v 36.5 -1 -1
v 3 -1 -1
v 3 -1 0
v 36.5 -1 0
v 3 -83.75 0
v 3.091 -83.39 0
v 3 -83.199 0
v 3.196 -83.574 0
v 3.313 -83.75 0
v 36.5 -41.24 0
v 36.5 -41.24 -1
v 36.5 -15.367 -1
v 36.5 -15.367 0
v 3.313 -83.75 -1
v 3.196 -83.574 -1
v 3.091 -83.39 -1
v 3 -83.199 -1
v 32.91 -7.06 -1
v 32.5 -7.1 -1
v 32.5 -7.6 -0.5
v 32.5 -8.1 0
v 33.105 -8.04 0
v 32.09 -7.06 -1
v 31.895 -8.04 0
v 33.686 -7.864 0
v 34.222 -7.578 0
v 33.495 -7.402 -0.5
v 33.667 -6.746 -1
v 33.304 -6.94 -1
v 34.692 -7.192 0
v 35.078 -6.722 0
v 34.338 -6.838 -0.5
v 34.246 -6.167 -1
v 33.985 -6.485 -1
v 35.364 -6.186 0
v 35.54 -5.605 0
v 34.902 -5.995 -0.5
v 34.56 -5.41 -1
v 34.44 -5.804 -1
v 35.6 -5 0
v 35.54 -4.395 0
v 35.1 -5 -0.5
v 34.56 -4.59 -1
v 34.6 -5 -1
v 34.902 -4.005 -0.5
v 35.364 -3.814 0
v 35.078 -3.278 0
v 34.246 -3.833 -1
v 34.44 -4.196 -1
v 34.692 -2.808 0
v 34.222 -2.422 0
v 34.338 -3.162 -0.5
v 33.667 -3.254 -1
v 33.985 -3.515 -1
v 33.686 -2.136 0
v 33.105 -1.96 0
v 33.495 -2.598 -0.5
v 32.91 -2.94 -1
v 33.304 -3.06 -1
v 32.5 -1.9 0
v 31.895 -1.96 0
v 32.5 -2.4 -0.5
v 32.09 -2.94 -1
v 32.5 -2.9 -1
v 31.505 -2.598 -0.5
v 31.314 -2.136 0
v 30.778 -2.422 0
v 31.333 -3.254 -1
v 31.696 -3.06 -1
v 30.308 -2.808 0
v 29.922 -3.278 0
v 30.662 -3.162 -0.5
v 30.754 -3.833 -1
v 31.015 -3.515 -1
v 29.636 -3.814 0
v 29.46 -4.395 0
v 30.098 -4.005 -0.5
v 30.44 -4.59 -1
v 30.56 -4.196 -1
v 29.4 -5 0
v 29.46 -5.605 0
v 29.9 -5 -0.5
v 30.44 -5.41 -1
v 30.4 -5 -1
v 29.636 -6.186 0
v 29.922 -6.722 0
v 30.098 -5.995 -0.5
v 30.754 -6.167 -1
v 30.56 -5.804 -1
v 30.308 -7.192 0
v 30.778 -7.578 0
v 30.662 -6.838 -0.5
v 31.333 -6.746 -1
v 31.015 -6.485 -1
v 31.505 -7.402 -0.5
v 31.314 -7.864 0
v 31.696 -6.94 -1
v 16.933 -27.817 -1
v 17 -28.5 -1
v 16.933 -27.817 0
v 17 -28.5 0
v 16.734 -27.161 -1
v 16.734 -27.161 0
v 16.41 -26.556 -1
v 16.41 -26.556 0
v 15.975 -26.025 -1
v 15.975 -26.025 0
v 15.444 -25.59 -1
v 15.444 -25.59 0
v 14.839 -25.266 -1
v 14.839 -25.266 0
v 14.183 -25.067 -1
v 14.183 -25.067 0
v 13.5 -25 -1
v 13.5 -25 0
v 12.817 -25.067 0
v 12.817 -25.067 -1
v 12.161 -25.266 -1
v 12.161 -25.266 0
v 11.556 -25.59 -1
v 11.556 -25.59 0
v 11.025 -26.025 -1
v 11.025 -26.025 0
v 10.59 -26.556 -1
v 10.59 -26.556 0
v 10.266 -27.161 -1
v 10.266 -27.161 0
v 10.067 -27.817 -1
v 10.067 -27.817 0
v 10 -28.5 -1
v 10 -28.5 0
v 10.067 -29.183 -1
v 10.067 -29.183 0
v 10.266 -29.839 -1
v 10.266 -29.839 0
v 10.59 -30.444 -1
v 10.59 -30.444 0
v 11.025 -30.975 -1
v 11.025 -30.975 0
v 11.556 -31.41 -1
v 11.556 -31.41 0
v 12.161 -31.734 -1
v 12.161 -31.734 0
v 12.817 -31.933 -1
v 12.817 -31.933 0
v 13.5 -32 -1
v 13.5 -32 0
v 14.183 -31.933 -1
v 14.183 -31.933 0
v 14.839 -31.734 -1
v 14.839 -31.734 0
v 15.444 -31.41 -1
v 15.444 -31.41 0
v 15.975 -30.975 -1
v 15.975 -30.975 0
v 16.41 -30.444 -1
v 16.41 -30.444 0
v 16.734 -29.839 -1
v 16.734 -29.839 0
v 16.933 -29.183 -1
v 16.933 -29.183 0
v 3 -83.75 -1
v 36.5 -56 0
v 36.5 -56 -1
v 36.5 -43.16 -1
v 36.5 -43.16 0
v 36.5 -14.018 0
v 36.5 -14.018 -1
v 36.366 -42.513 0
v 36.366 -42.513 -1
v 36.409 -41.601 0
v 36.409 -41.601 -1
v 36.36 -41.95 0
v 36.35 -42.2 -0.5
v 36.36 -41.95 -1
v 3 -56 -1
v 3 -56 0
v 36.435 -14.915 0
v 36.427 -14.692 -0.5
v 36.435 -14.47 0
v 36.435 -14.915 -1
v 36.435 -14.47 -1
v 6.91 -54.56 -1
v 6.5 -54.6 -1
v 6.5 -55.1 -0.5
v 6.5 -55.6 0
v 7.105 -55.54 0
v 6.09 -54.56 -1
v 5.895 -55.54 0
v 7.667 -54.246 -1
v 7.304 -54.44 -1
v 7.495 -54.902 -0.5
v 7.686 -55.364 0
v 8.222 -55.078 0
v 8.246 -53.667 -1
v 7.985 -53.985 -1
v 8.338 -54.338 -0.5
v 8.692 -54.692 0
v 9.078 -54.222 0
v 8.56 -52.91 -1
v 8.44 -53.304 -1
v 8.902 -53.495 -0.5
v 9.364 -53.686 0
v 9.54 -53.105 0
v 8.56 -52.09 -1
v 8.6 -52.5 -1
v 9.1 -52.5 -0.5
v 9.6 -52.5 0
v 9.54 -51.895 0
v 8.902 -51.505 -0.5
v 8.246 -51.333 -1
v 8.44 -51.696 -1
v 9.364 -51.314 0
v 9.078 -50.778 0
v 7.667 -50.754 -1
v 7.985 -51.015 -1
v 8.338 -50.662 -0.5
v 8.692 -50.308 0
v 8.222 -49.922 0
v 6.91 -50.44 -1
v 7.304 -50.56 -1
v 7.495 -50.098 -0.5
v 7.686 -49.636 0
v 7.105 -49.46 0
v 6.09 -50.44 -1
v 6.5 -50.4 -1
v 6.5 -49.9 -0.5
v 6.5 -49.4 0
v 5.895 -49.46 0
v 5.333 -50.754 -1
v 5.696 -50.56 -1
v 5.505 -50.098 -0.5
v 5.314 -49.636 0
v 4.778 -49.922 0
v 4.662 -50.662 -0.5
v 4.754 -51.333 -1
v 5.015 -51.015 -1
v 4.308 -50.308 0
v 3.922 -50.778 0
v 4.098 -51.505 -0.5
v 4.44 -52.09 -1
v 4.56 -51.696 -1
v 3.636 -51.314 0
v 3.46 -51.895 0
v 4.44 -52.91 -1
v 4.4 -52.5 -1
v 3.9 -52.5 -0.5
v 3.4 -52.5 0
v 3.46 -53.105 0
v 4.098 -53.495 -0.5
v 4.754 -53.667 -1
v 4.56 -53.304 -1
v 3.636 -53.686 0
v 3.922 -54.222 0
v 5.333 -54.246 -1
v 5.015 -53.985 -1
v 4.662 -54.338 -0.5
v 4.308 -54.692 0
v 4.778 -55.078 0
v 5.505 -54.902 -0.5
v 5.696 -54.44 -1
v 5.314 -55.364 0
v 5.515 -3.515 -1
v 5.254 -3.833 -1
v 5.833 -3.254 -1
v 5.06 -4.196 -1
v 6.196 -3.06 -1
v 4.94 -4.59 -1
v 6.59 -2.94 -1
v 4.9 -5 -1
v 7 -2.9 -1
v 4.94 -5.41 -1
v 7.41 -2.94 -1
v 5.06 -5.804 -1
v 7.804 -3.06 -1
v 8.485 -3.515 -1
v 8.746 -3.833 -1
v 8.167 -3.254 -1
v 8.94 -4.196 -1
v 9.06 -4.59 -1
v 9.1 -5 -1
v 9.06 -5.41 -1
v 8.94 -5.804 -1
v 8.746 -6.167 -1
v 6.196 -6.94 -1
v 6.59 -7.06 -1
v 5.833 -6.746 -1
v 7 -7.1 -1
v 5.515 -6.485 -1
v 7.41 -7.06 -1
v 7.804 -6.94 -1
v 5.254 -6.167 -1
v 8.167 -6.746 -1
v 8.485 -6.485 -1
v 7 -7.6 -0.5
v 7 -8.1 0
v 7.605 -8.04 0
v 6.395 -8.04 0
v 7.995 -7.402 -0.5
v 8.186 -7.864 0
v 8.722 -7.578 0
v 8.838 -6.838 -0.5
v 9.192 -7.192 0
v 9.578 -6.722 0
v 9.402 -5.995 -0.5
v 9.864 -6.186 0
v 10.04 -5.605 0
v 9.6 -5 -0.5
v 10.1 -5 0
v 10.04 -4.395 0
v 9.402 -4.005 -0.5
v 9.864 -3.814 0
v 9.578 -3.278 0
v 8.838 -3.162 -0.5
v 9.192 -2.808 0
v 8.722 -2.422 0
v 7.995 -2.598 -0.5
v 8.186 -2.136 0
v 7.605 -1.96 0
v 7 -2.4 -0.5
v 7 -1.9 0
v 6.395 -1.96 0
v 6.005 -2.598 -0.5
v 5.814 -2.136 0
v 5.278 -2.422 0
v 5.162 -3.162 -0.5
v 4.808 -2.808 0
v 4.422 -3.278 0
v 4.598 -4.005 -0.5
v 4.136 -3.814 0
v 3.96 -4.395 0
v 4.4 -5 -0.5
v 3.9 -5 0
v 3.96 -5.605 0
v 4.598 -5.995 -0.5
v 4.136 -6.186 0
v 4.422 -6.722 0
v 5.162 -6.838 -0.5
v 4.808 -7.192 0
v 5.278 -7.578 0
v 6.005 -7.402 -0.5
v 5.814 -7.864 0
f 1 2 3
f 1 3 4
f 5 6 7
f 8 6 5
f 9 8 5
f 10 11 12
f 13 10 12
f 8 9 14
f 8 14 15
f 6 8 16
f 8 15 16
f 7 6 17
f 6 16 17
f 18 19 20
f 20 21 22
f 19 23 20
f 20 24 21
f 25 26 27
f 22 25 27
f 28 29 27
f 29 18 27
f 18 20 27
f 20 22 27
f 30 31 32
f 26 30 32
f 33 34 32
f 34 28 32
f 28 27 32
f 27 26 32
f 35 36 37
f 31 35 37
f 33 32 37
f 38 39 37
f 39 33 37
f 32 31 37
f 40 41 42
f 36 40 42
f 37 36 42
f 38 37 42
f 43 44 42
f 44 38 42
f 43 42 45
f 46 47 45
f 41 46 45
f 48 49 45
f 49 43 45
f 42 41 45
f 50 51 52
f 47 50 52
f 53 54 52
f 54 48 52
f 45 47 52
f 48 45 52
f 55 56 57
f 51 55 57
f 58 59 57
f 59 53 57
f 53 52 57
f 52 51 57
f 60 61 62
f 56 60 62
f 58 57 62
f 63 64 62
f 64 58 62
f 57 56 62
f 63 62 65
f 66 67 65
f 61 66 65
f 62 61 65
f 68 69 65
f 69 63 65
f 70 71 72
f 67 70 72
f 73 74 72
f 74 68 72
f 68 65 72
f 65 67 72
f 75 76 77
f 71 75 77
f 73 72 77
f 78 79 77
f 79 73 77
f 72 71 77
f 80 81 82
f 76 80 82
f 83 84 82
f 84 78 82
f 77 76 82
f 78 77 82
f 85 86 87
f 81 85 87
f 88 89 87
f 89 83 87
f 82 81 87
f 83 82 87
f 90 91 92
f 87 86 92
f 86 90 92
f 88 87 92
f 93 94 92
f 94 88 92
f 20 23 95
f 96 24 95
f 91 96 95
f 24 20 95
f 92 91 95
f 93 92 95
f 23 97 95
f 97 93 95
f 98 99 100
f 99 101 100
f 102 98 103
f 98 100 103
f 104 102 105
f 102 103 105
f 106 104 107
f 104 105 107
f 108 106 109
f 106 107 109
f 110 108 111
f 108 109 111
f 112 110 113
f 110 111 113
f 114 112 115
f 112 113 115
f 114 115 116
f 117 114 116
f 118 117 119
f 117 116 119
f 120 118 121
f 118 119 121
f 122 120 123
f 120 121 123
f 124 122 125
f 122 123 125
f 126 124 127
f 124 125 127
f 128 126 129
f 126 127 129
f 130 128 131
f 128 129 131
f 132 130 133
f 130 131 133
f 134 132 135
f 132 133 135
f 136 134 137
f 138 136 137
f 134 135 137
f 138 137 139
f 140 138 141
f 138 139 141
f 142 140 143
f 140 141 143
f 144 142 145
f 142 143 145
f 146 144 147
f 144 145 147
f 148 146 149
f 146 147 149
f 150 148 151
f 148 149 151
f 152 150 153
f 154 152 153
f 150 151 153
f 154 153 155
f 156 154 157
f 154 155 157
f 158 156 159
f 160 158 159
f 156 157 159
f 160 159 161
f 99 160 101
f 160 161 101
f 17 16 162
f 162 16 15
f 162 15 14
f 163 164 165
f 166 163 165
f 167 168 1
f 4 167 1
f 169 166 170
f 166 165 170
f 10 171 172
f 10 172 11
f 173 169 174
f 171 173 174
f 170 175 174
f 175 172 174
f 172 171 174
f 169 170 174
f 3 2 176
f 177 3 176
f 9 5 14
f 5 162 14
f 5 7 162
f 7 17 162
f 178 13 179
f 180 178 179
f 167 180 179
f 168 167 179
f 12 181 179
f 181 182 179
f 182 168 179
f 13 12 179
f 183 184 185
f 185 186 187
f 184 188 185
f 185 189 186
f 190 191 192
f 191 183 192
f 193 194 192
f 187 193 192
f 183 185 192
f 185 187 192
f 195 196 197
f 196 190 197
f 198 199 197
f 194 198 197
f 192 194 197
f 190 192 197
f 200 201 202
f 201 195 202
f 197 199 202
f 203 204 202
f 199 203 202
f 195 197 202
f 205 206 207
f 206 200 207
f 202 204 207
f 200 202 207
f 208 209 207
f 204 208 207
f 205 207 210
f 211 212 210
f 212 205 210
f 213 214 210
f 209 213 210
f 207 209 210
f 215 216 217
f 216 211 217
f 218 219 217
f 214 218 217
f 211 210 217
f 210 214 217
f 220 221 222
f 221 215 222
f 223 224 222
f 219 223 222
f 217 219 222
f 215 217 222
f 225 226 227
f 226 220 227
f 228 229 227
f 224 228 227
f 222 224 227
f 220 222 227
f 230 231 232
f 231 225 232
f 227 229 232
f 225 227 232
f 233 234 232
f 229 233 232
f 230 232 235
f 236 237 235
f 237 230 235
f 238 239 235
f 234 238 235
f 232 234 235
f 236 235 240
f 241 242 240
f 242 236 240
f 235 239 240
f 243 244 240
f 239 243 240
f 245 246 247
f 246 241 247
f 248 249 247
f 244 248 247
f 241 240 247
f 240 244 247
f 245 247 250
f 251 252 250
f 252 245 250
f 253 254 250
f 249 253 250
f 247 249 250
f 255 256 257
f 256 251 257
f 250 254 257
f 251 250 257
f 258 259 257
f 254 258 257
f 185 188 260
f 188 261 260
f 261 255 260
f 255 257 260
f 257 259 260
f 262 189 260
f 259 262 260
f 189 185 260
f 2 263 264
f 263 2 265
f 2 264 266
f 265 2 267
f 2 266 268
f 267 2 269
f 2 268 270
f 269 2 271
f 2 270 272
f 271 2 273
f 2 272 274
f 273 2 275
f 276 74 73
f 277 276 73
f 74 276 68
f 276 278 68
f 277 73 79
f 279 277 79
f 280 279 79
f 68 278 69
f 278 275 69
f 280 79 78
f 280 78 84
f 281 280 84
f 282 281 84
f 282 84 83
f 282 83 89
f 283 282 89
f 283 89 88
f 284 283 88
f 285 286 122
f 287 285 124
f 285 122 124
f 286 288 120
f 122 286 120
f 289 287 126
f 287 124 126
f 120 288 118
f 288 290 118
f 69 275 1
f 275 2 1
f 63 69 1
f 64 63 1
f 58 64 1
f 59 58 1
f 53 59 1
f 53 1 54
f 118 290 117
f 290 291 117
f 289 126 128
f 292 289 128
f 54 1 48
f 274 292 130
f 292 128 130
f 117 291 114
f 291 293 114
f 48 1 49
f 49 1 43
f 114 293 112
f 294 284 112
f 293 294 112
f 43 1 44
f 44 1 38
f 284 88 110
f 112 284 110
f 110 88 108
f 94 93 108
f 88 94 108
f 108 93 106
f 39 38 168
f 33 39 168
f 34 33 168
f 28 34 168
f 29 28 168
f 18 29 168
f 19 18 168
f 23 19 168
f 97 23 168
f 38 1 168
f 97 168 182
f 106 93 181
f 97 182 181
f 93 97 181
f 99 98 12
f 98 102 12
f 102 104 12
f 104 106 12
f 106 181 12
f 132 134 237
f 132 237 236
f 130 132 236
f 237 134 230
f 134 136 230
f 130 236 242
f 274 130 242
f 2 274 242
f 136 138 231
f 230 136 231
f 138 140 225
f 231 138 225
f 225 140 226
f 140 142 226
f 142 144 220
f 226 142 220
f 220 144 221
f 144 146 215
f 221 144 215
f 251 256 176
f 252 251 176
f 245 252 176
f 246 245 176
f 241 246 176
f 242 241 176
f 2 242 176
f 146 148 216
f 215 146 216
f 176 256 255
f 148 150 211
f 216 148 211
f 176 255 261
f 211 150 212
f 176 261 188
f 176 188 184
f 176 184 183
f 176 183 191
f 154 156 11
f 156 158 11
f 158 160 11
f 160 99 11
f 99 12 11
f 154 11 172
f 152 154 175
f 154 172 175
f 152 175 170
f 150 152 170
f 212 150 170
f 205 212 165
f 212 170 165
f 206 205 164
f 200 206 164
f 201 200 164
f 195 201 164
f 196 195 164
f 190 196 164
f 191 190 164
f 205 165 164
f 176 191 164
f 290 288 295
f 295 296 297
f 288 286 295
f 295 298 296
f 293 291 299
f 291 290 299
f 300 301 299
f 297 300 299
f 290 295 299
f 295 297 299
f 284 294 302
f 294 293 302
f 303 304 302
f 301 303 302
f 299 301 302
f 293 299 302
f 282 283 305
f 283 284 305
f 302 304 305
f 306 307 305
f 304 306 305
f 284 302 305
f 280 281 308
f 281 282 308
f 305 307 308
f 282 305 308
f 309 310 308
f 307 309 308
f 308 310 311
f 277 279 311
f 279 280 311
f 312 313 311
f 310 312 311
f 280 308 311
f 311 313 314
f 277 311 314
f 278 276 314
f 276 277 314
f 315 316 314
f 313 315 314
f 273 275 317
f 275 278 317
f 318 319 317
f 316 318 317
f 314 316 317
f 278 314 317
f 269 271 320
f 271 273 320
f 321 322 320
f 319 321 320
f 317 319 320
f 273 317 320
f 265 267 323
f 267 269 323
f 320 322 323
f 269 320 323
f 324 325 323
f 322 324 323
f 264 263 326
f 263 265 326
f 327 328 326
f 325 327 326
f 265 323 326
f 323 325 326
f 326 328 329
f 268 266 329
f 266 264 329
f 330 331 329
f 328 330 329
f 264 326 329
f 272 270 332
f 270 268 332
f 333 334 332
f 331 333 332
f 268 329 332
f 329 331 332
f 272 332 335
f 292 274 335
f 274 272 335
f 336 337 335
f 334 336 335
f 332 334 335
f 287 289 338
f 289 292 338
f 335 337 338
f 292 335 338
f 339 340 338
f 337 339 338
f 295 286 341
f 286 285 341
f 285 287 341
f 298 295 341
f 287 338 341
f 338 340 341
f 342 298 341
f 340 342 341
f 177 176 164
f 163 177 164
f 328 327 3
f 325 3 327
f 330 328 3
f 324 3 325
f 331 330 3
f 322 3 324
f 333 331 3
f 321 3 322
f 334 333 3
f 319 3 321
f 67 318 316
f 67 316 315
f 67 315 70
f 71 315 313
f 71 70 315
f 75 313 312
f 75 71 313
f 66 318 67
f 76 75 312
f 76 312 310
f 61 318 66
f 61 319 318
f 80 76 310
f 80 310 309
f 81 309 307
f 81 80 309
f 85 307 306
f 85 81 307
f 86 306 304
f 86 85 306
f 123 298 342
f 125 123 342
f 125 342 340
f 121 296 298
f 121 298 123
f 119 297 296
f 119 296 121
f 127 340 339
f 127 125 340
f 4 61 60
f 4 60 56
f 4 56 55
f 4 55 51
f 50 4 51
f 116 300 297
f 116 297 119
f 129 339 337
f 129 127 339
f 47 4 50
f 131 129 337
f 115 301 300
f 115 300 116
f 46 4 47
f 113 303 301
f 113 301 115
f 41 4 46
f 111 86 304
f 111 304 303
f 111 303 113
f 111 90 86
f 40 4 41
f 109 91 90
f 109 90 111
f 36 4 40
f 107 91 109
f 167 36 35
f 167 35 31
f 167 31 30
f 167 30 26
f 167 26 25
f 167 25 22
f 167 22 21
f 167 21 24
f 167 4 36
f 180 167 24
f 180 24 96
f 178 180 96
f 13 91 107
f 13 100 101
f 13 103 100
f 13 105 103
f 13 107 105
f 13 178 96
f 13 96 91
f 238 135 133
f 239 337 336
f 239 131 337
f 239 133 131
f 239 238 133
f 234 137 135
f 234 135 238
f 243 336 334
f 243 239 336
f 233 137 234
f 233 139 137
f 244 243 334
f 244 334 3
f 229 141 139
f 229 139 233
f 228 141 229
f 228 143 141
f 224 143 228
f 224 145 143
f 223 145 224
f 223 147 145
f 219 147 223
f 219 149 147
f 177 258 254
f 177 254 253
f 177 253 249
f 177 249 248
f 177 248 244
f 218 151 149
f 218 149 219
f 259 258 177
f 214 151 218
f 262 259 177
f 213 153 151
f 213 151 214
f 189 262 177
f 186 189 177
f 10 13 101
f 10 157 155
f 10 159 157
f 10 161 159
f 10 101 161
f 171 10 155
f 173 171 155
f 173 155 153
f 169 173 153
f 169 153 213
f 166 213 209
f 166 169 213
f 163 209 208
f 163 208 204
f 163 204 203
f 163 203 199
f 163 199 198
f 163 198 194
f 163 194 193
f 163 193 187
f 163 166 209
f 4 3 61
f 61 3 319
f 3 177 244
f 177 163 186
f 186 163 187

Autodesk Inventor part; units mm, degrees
ref_plane "YZ Plane" through (0, 0, 0) normal (1, 0, 0) x (0, 1, 0)
ref_plane "XZ Plane" through (0, 0, 0) normal (0, 1, 0) x (-1, 0, 0)
ref_plane "XY Plane" through (0, 0, 0) normal (0, 0, 1) x (1, 0, 0)
ref_plane "Work Plane1" through (3, 4, -1) normal (0, 0, 1) x (0, -1, 0)
sketch "Sketch1" plane through (3, 4, -1) normal (0, 0, 1) x (0, -1, 0)
  line L0 (87.75, 33.5) -> (84.9105, 33.5) projected
  line L1 (5, 0) -> (5, 33.5) projected
  line L2 (5, 0) -> (87.75, 0) projected
  line L3 (5, 0) -> (60, 0) projected
  line L4 (5, -3) -> (5, 0) projected
  line L5 (4, -3) -> (60, -3) projected
  line L6 (60, 33.5) -> (60, 3.949) projected
  line L7 (60, -3) -> (60, 0) projected
  line L8 (87.199, 0) -> (183, 0) projected
  circle A0 centre (74.375, 17.375) radius 6.75 projected
  line L9 (60, 0) -> (60, 33.5)
  circle A1 centre (32.5, 10.5) radius 5.5 projected
  circle A2 centre (9, 4) radius 2.1 projected
  circle A3 centre (9, 29.5) radius 2.1 projected
  circle A4 centre (56.5, 3.5) radius 2.1 projected
  line L10 (82.9895, 33.5) -> (65.5855, 33.5) projected
  line L11 (63.6645, 33.5) -> (47.1605, 33.5) projected
  spline S0 degree 2 poles (47.1605, 33.5) (46.2, 33.2071) (45.2395, 33.5) knots 0 0 0 0.194422 0.194422 0.194422 weights 1 1.05 1 projected
  line L12 (45.2395, 33.5) -> (19.3669, 33.5) projected
  line L13 (183, 0) -> (183, 4.5) projected
  line L14 (183, 4.5) -> (137.8889, 33.5) projected
  line L15 (137.8889, 33.5) -> (60, 33.5) projected
  arc A5 (63.949, 0) -> (60, 3.949) centre (62.75, 2.75) ccw projected
  line L16 (63.949, 0) -> (84.801, 0) projected
  arc A6 (87.199, 0) -> (84.801, 0) centre (86, 2.75) ccw projected
  spline S1 degree 2 poles (19.3669, 33.5) (18.6923, 33.3555) (18.0177, 33.5) knots 0 0 0 0.135703 0.135703 0.135703 weights 1 1.02375 1 projected
  spline S2 degree 2 poles (84.9105, 33.5) (83.95, 33.2071) (82.9895, 33.5) knots 0 0 0 0.194422 0.194422 0.194422 weights 1 1.05 1 projected
  spline S3 degree 2 poles (65.5855, 33.5) (64.625, 33.2071) (63.6645, 33.5) knots 0 0 0 0.194422 0.194422 0.194422 weights 1 1.05 1 projected
  line L17 (87.75, 0) -> (87.75, 33.5) projected
  line L18 (18.0177, 33.5) -> (5, 33.5) projected
  point P0 (89.75, 33.5)
  point P1 (52, 0)
  point P2 (64.076, 0)
  point P3 (87.674, 0)
  point P4 (63.25, 3.25)
  point P5 (60, 3.949)
  point P6 (86.9105, 33.5)
  point P7 (84.9895, 33.5)
  point P8 (87.75, 5.1867)
  point P9 (87.75, 0.3133)
  point P10 (60, 3.949)
  point P11 (87.199, 0)
extrude "Extrusion1" add sketch "Sketch1" along normal blind 1 contours L17 L2 A6 | L2 L1 L18 S1 L12 S0 L11 L6 L9 | A1 | A2 | A3 | A4 picked at (87.6913, 0.1698)
sketch "Sketch2" plane through (3, 4, 0) normal (0, 0, 1) x (1, 0, 0)
  line L0 (12.5287, -34.71) -> (8.4496, -34.6899)
  arc A0 (8.4713, -30.29) -> (8.4496, -34.6899) centre (10.5, -32.5) ccw
  line L1 (8.4713, -30.29) -> (12.5504, -30.3101)
  arc A1 (12.5287, -34.71) -> (12.5504, -30.3101) centre (10.5, -32.5) ccw
  circle A2 centre (10.5, -32.5) radius 3
  circle A3 centre (10.5, -32.5) radius 3.5
  point P0 (-3, -4)
  dimension "d5" = 0.5
extrude "Extrusion2" cut sketch "Sketch2" against normal up to next contours A2 L0 | L0 A0 L1 A1 | A2 L1 | A3
sketch "Sketch3" plane through (3, 4, 0) normal (0, 0, 1) x (1, 0, 0)
  circle A0 centre (10.5, -32.5) radius 3.5 projected
  line L0 (0, -5) -> (0, -60) projected
  line L1 (33.5, -5) -> (0, -5) projected
  circle A1 centre (3.5, -56.5) radius 3.5
  circle A2 centre (4, -9) radius 4
  circle A3 centre (3.5, -56.5) radius 2.6
  circle A4 centre (4, -9) radius 2.6
  circle A5 centre (29.5, -9) radius 4
  circle A6 centre (29.5, -9) radius 2.6
  line L2 (33.5, -60) -> (33.5, -47.1605) projected
  line L3 (33.5, -45.2395) -> (33.5, -19.3669) projected
  line L4 (33.5, -18.0177) -> (33.5, -5) projected
  line L5 (0, -87.75) -> (0.3133, -87.75) projected
  arc A7 (0, -87.199) -> (0.3133, -87.75) centre (2.75, -86) ccw projected
  line L6 (0, -87.199) -> (0, -87.75) projected
  line L7 (0, -60) -> (33.5, -60) projected
  point P0 (-3, -4)
  dimension "d8" = 7
  dimension "d17" = 8
  dimension "d18" = 5.2
  dimension "d19" = 5.2
  dimension "d20" = 4
  dimension "d21" = 4
  dimension "d22" = 8
  dimension "d23" = 5.2
  dimension "d25" = 4
hole "Hole1" at (6.5, -52.5, 0) at (7, -5, 0) at (32.5, -5, 0) direction (0, 0, -1) diameter 3.6 end through all countersink diameter 6.2 countersink angle 90 clearance for "Countersunk Flat Head Screw ISO 2009/7046" size "M3" standard "ISO"
properties part number "right_metal_gear_bracker"
